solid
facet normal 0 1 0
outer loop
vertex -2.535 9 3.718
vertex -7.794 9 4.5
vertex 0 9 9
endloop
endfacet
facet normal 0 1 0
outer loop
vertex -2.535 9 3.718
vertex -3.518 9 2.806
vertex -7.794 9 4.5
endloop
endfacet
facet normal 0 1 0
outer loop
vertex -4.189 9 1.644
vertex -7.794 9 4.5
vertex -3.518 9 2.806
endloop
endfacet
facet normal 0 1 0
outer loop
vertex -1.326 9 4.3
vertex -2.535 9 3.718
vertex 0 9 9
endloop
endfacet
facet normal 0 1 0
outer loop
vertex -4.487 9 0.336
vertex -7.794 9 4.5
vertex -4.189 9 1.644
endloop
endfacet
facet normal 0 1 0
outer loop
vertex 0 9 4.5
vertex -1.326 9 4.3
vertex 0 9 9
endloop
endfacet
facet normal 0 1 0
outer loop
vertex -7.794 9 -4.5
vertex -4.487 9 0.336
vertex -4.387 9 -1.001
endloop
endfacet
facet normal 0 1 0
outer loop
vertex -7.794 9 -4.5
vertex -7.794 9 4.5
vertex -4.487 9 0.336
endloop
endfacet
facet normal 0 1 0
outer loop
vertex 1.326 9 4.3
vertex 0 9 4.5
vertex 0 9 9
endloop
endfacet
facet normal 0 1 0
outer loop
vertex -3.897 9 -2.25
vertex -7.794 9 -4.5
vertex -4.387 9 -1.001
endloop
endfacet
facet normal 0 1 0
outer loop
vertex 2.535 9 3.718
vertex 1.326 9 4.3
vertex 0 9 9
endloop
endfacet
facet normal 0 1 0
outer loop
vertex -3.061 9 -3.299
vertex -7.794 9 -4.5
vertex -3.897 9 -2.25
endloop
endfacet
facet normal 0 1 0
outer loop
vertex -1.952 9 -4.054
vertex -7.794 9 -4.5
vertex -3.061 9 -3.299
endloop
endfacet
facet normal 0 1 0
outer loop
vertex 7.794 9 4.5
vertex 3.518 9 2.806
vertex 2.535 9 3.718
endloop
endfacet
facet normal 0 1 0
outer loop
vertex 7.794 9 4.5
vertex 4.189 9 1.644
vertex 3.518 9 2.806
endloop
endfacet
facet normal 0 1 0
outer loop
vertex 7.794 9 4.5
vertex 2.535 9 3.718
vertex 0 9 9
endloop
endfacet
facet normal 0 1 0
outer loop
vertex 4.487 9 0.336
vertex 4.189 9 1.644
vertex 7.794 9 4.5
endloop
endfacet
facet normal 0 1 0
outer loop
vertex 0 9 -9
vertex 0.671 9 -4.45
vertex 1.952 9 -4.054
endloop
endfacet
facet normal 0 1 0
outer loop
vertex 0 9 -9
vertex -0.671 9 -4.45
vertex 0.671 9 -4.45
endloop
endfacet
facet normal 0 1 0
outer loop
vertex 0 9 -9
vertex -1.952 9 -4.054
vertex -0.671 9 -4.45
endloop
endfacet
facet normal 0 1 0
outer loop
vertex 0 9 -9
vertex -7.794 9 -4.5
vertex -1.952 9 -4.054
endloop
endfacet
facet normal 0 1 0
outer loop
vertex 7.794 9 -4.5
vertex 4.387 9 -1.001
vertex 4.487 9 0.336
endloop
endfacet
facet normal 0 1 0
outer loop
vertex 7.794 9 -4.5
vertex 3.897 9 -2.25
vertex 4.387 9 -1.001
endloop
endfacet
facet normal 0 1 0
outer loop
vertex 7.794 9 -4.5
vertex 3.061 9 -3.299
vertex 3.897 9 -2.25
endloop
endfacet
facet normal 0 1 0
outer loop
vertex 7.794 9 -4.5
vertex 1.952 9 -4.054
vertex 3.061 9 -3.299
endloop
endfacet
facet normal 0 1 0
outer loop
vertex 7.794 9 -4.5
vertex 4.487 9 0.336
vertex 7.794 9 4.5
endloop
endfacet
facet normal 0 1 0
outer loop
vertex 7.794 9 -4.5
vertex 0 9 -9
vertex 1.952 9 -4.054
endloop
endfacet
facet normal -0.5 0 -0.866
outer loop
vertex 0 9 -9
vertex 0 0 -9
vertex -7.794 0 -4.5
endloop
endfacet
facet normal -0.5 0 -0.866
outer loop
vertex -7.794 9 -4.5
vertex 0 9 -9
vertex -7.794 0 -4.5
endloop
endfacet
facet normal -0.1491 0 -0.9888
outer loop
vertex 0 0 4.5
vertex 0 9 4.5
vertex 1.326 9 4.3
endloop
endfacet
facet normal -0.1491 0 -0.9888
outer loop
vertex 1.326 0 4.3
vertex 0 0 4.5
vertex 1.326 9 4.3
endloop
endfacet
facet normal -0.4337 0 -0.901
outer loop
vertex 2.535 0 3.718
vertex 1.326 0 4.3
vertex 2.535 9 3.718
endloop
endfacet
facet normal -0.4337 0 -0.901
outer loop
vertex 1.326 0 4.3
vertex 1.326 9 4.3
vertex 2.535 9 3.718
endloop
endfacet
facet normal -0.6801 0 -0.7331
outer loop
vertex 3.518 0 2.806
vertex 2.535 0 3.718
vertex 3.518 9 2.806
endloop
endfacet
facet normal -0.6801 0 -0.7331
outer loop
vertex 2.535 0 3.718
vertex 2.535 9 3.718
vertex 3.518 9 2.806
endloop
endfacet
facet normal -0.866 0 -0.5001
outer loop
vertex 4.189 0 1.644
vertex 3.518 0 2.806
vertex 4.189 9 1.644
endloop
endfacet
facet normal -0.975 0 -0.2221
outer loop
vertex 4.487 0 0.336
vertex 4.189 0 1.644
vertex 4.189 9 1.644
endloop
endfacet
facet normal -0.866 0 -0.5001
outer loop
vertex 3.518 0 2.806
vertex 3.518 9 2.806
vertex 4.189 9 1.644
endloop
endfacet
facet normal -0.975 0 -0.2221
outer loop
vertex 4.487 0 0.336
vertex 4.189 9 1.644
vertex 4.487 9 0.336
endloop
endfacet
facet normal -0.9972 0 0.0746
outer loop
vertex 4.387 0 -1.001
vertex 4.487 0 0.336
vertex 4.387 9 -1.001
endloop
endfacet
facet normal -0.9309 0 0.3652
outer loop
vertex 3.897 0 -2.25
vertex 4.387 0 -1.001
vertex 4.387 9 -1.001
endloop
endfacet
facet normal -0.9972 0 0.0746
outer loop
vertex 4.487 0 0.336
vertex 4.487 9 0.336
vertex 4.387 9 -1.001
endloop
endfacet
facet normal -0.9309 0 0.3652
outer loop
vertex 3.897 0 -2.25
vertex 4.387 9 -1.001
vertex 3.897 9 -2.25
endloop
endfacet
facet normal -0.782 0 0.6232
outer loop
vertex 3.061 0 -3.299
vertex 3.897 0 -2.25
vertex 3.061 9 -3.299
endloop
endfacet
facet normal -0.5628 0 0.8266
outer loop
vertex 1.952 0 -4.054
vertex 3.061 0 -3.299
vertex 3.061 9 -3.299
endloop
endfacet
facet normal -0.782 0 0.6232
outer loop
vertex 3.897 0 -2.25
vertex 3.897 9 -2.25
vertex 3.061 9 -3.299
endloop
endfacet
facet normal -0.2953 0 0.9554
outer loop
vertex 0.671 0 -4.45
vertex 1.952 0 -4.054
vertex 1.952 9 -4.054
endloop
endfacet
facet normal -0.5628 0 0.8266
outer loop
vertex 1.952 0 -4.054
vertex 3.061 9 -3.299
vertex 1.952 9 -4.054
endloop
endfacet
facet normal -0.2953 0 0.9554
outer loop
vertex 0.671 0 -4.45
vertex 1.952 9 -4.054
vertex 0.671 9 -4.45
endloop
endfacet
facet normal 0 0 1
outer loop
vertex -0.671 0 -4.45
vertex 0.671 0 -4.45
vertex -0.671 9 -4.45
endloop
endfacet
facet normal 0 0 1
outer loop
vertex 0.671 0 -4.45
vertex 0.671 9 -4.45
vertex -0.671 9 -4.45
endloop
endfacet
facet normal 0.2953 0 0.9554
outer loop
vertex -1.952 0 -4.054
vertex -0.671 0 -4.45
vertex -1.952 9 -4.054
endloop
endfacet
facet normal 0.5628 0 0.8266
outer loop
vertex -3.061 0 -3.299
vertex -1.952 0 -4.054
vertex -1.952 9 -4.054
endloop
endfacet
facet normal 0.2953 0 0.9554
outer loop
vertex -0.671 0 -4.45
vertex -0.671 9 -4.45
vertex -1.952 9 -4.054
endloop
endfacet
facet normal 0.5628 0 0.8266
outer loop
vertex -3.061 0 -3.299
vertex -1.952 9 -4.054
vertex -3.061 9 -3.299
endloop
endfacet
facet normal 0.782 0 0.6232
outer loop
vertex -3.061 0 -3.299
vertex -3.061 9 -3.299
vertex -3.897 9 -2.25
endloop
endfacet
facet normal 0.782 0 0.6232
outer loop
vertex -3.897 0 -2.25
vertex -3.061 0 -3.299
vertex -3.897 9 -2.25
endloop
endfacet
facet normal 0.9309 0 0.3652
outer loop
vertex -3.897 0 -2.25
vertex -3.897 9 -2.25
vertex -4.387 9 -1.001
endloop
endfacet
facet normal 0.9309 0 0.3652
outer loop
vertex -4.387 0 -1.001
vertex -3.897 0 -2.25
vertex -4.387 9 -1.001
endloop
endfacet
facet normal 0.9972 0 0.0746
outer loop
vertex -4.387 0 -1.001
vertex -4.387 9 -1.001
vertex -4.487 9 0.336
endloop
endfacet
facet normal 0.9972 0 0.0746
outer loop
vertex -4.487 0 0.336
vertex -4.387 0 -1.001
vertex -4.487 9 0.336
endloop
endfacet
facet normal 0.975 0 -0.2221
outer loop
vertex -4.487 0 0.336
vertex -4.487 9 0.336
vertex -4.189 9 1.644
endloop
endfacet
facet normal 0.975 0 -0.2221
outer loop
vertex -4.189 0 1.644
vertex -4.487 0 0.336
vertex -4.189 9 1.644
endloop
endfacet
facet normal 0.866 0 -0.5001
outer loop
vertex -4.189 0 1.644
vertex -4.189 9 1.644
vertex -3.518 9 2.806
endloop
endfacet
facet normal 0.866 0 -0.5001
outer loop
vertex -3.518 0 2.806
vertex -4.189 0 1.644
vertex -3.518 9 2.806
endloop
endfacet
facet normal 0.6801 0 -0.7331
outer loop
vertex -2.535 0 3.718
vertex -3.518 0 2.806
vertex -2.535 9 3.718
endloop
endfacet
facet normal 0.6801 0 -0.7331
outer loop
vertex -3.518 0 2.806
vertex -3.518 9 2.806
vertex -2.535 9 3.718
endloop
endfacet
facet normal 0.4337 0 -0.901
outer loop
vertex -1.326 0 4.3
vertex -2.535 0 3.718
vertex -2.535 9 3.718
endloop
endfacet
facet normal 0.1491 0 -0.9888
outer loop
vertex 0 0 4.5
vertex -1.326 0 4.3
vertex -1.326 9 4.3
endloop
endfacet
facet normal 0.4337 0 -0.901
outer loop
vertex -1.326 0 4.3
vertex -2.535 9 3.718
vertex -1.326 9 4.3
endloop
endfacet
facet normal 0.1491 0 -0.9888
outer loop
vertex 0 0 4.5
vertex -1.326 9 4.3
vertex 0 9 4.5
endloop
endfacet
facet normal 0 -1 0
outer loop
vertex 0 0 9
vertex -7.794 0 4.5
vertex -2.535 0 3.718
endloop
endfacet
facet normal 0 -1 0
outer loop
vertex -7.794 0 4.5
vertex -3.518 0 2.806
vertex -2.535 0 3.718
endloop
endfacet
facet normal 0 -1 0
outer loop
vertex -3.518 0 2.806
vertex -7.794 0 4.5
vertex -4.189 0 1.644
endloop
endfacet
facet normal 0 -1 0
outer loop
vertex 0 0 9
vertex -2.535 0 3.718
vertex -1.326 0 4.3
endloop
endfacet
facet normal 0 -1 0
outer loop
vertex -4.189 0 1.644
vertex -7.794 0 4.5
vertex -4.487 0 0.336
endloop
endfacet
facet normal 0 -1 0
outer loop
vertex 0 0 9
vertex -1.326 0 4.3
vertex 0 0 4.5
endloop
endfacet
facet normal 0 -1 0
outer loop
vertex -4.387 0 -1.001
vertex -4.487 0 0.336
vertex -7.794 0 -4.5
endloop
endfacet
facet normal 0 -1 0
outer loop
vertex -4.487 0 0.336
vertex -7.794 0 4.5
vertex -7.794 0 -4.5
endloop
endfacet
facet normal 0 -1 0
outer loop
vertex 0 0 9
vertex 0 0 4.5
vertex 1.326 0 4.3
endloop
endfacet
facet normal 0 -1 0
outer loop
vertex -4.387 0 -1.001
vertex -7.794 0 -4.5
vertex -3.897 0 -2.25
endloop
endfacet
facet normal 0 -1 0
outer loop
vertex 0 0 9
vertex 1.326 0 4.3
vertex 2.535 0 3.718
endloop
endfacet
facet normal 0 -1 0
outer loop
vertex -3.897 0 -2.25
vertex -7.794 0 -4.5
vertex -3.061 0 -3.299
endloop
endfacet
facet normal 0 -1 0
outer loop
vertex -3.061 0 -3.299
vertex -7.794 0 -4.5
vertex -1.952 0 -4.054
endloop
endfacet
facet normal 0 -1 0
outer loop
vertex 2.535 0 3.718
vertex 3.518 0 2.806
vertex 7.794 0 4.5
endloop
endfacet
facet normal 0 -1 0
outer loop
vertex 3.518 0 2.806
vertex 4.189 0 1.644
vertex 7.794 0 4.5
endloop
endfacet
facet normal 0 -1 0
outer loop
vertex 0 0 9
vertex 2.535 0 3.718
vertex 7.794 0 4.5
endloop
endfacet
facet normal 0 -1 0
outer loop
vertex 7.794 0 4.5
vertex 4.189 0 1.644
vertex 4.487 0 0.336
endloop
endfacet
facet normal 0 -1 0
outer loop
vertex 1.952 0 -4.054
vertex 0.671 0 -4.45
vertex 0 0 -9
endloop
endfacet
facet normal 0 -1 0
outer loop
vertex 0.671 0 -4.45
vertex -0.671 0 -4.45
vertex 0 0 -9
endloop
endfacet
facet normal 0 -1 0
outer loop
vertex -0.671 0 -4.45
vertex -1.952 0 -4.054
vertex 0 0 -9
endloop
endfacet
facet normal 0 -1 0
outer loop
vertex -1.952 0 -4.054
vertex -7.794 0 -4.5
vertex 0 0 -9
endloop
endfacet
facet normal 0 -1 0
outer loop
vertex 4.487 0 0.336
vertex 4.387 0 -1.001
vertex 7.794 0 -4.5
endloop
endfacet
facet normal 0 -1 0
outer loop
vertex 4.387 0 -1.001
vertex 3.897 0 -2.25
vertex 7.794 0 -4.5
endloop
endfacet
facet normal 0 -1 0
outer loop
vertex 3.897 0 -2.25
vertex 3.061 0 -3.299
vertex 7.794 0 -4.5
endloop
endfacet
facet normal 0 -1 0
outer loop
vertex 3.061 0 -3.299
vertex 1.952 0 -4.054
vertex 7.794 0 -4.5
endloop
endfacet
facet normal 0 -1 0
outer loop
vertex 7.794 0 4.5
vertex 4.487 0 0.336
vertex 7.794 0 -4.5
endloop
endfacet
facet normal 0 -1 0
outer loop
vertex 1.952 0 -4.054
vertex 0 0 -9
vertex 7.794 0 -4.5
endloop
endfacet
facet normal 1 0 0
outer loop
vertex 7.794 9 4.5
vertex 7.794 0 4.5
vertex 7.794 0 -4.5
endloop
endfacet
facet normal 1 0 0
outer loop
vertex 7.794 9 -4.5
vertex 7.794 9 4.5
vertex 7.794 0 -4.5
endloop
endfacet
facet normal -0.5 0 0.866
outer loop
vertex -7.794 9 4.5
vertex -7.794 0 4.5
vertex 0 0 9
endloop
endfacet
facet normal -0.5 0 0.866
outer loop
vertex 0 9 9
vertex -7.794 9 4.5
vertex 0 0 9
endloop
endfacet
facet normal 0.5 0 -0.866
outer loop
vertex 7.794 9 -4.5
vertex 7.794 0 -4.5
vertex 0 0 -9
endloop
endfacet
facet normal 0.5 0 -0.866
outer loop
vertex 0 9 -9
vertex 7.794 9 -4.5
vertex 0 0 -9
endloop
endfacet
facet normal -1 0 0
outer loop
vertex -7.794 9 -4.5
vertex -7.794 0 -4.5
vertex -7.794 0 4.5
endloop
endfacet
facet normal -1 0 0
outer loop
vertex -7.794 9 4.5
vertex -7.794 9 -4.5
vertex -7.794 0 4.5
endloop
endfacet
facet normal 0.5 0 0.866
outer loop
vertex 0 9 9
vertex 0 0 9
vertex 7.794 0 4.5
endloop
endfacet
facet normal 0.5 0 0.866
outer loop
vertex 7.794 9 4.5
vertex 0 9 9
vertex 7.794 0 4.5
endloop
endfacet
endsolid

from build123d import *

# Parameters (mm, degrees)
BOSS_EXTRUDE1_DEPTH = 9
SKETCH2_R           = 4.5
CUT_EXTRUDE1_DEPTH  = 9


with BuildPart() as part:
    # Sketch1 → Boss-Extrude1 (new body)
    with BuildSketch(Plane(origin=(0, 0, 0), x_dir=(1, 0, 0), z_dir=(0, 1, 0))):
        Polygon((0, 9), (-7.794228634, 4.5), (-7.794228634, -4.5), (0, -9), (7.794228634, -4.5), (7.794228634, 4.5), align=None)
    extrude(amount=BOSS_EXTRUDE1_DEPTH)

    # Sketch2 → Cut-Extrude1 (cut)
    with BuildSketch(Plane(origin=(0, 9, 0), x_dir=(1, 0, 0), z_dir=(0, 1, 0))):
        with Locations(Location((0, 0, 0), (0, 0, 270))):  # turned: the seam where the file's is
            Circle(SKETCH2_R)
    extrude(amount=-CUT_EXTRUDE1_DEPTH, mode=Mode.SUBTRACT)


solid = part.part
